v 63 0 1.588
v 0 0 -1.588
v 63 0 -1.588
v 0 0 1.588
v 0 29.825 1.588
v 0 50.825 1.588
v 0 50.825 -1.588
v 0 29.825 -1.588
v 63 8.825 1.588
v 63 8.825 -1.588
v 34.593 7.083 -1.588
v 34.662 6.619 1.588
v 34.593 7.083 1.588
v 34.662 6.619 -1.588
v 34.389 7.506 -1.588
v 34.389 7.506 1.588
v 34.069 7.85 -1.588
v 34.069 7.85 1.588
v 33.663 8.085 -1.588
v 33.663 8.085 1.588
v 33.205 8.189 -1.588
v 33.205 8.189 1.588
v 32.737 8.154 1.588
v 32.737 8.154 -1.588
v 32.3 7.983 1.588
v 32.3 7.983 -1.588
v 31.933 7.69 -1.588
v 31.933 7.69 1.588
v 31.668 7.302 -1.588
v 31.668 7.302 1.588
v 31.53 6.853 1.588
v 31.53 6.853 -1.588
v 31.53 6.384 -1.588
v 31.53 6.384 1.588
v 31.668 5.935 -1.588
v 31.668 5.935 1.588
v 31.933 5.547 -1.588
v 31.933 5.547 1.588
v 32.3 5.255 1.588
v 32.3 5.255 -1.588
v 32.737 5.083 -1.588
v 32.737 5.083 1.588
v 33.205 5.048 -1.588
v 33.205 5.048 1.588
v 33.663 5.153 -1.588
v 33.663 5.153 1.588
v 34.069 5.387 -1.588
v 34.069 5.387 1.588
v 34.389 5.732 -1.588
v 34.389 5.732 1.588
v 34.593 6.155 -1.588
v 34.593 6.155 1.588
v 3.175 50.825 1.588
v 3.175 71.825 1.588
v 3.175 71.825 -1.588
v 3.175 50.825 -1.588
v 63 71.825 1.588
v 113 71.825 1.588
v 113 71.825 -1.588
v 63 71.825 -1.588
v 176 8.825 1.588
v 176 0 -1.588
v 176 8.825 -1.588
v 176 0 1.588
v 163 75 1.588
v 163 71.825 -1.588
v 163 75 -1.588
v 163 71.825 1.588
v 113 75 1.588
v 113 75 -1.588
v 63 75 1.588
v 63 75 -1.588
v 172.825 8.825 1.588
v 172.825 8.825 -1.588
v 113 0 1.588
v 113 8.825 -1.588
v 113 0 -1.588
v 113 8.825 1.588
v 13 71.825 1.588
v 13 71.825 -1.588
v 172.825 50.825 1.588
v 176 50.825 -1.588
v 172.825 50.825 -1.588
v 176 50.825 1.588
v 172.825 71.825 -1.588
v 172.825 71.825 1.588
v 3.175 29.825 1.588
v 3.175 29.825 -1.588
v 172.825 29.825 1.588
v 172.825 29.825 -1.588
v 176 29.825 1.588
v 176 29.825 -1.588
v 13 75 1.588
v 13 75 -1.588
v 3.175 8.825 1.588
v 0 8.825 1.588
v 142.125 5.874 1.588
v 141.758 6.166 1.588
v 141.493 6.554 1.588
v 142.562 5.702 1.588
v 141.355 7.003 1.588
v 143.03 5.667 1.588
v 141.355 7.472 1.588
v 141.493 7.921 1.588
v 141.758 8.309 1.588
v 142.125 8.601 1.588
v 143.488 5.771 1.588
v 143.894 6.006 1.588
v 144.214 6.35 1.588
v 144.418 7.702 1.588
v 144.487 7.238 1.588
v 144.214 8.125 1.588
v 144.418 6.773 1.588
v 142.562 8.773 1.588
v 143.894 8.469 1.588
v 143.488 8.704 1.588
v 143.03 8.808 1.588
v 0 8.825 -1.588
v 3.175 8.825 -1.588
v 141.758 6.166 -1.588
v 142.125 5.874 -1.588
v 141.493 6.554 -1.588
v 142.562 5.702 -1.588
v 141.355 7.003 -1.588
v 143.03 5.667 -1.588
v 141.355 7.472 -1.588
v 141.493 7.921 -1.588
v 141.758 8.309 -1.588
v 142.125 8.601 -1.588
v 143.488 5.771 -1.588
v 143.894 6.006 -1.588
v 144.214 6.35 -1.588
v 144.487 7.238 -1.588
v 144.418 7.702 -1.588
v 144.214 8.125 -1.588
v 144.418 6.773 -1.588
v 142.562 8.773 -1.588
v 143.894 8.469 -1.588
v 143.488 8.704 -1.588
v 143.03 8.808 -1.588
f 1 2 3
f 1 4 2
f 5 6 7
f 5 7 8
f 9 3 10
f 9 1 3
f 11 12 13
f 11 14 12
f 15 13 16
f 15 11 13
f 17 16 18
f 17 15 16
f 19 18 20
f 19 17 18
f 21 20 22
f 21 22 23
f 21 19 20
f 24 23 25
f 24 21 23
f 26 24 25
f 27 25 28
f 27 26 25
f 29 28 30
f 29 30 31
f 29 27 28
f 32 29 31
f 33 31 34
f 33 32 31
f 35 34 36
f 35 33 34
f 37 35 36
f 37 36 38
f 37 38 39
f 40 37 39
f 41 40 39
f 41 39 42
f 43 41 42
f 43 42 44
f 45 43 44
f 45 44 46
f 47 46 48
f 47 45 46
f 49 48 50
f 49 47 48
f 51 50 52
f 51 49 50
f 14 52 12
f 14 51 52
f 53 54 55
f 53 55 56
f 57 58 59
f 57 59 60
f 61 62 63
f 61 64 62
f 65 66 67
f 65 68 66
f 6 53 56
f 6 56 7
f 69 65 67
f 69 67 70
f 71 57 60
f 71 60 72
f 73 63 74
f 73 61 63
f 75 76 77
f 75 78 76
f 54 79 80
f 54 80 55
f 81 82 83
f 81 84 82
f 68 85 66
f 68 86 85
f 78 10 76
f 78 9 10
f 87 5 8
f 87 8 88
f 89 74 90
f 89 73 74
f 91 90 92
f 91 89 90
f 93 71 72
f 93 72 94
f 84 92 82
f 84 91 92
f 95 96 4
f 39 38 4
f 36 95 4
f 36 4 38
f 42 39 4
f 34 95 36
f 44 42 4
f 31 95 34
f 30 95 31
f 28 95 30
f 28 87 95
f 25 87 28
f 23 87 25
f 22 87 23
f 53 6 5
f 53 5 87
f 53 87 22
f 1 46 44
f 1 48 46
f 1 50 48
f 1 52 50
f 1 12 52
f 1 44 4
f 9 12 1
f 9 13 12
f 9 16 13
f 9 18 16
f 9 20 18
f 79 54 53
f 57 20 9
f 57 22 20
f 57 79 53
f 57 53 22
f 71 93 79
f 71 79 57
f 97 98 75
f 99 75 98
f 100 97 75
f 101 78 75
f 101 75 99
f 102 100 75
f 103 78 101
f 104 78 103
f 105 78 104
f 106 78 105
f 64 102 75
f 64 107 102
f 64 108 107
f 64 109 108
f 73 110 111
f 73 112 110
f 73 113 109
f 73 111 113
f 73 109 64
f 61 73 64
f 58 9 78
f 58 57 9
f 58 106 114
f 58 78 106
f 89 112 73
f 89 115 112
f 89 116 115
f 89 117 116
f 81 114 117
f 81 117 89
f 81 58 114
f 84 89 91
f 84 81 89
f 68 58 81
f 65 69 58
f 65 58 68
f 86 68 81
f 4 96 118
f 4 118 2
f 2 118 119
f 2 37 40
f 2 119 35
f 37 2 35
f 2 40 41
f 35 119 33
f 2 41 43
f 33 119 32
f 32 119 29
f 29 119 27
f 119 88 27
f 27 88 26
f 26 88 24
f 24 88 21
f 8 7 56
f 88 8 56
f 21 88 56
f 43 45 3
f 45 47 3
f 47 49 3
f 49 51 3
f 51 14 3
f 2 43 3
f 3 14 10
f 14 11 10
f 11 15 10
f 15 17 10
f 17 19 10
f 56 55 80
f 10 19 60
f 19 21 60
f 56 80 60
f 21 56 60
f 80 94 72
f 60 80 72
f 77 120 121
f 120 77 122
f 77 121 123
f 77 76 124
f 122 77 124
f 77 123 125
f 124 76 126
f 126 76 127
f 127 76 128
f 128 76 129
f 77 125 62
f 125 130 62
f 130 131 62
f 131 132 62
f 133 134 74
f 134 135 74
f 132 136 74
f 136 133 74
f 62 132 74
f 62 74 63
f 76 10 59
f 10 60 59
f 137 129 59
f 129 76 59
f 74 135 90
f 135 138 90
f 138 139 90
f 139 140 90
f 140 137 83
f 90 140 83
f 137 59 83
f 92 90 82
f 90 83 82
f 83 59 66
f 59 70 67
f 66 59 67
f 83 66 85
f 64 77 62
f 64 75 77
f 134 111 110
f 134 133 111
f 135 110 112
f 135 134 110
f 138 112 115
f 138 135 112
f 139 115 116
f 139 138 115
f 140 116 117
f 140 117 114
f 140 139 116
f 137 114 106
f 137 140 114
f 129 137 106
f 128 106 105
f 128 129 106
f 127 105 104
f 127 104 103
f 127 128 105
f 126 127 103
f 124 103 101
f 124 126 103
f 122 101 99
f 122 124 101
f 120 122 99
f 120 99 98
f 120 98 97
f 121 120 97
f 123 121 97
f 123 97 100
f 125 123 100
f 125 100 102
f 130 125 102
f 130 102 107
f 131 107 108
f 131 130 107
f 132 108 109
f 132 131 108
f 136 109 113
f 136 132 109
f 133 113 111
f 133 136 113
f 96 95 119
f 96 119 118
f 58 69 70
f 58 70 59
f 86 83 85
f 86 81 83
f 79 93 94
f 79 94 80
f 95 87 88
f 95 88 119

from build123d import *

# Parameters (mm, degrees)
SKETCH1_R           = 1.575
BOSS_EXTRUDE1_DEPTH = 1.5875


with BuildPart() as part:
    # Sketch1 → Boss-Extrude1 (new body, symmetric)
    with BuildSketch(Plane.XY):
        Polygon((163, 71.825), (163, 75), (113, 75), (113, 71.825), (63, 71.825), (63, 75), (13, 75), (13, 71.825), (3.175, 71.825), (3.175, 50.825), (0, 50.825), (0, 29.825), (3.175, 29.825), (3.175, 8.825), (0, 8.825), (0, 0), (63, 0), (63, 8.825), (113, 8.825), (113, 0), (176, 0), (176, 8.825), (172.825, 8.825), (172.825, 29.825), (176, 29.825), (176, 50.825), (172.825, 50.825), (172.825, 71.825), align=None)
        with Locations((33.0875, 6.61875)):
            Circle(SKETCH1_R, mode=Mode.SUBTRACT)
        with Locations((142.9125, 7.2375)):
            Circle(SKETCH1_R, mode=Mode.SUBTRACT)
    extrude(amount=BOSS_EXTRUDE1_DEPTH, both=True)


solid = part.part
